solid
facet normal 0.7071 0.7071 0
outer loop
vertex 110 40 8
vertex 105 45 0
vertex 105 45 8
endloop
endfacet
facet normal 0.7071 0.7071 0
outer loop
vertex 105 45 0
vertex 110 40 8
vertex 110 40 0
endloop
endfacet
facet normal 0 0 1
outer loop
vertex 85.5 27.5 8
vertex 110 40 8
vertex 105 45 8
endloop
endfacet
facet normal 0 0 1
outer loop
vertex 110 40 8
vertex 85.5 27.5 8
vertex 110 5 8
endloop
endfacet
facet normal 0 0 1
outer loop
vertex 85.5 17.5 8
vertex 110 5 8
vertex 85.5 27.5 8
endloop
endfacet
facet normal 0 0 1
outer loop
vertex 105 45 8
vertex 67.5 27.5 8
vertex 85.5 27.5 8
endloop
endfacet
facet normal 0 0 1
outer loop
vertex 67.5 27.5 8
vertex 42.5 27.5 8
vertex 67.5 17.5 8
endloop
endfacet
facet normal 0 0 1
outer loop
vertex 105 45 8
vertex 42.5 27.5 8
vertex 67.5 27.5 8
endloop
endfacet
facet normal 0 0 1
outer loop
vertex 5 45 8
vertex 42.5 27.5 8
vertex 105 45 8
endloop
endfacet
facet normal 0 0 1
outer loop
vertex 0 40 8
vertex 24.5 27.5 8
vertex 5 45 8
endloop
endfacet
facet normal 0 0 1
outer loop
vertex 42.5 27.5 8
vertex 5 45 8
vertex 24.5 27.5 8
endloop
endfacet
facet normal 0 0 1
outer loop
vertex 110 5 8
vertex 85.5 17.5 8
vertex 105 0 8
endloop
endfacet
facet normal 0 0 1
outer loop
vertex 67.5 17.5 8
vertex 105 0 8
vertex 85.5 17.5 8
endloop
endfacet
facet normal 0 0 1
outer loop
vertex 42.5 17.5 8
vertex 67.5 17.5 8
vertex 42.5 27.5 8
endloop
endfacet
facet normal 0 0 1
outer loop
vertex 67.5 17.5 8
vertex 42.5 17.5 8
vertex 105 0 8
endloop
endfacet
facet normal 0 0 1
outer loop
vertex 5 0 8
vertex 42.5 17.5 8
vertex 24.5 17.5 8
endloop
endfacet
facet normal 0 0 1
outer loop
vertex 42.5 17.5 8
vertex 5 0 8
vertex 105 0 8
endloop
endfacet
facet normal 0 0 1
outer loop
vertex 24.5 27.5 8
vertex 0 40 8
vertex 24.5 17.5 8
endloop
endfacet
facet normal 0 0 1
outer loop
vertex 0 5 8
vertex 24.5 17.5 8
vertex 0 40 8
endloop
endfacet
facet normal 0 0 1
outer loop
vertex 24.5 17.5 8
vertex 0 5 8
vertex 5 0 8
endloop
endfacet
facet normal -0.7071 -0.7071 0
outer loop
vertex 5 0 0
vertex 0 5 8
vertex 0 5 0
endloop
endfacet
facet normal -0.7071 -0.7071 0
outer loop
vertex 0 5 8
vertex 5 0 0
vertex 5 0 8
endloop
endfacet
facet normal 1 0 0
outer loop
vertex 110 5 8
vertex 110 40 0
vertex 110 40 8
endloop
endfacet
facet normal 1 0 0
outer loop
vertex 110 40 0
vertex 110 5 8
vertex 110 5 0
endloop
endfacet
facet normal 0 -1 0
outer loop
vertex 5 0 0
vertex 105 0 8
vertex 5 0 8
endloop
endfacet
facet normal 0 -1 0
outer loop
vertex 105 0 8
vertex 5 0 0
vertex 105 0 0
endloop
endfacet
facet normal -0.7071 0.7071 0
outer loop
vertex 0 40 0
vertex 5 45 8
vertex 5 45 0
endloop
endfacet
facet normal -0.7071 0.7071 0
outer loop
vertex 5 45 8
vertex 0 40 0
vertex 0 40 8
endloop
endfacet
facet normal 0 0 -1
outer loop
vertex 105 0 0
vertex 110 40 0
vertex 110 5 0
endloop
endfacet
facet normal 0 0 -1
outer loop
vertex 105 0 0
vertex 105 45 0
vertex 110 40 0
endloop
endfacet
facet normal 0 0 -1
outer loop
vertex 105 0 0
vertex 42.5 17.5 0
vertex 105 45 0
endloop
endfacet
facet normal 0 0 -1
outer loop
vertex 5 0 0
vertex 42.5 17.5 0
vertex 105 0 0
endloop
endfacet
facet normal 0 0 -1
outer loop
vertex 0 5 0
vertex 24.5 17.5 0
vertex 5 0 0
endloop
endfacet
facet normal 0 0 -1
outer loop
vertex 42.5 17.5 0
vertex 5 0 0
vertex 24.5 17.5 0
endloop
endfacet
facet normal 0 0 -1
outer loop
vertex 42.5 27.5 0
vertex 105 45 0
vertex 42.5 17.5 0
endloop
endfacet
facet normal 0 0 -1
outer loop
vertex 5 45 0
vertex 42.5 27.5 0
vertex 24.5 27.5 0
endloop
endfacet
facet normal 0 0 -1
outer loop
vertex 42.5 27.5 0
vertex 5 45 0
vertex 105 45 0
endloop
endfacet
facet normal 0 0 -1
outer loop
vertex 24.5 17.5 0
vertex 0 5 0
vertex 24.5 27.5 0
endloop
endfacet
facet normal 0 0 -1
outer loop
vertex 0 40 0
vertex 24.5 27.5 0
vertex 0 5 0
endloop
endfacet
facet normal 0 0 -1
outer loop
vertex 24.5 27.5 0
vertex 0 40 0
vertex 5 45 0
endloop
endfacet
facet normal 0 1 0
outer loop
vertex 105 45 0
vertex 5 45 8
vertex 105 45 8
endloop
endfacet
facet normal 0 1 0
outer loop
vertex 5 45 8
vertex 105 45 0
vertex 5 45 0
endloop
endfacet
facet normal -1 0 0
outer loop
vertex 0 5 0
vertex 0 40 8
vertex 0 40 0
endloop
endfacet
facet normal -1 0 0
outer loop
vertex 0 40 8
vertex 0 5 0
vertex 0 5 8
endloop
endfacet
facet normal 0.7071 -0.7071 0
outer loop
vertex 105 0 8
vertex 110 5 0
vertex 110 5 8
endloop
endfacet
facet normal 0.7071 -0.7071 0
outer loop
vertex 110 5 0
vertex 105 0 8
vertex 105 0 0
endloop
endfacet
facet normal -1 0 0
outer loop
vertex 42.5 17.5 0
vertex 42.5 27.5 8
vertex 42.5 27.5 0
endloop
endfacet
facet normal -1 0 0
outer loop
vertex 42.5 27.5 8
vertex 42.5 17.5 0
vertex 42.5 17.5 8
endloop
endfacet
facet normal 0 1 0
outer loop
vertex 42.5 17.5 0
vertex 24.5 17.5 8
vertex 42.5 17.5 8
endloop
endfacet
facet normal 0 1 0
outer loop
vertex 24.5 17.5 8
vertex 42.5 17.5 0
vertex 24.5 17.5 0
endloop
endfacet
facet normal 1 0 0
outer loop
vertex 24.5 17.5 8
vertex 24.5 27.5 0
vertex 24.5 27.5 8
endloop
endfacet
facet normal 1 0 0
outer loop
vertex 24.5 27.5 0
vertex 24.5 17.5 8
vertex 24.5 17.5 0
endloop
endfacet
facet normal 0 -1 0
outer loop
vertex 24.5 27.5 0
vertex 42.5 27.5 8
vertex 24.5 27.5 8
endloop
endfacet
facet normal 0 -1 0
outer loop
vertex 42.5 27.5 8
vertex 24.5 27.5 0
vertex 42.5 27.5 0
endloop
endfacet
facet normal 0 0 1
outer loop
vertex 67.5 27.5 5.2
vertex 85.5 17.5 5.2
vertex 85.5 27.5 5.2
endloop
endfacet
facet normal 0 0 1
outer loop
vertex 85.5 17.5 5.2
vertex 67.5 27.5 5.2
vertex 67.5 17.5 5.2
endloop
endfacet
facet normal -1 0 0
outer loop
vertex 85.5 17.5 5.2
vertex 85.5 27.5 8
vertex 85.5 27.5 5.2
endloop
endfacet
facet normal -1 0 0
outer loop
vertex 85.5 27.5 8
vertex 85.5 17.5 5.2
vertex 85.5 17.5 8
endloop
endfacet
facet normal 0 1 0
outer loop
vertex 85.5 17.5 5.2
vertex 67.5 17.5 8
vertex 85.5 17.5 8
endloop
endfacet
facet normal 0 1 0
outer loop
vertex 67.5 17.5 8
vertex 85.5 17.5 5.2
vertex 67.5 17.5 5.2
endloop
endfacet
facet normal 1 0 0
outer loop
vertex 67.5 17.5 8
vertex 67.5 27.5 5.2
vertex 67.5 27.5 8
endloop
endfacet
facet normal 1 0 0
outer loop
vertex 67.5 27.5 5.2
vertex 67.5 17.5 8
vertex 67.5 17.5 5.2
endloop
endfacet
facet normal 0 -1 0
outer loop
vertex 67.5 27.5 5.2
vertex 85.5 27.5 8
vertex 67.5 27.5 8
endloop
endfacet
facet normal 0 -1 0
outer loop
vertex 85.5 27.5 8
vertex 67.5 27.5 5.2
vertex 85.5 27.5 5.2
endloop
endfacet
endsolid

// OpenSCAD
$fn = 32;

// ----------------------------------------------------------------------
// Windowed plate: 2 voids, 110 x 45 x 8 mm
// ----------------------------------------------------------------------

// --- parameters (mm) ---
plate_l = 110;            // plate length, X
plate_w = 45;             // plate width, Y
plate_t = 8;              // plate thickness, Z
edge_margin = 12;         // wall from the plate edge to any window
windows = 2;              // number of windows in the row
win_l = 18;               // window length
win_w = 10;               // window width
win_pitch = 43;           // window pitch along X
depth_1 = 8;              // depth of void 1 (full thickness = through)
depth_2 = 2.8;            // depth of void 2 (full thickness = through)
corner_c = 5;             // corner chamfer of the plate

profile = [[5, 0], [105, 0], [110, 5], [110, 40], [105, 45], [5, 45], [0, 40], [0, 5]];  // primary outline, 8 points, counter clockwise
void_1 = [[24.5, 17.5], [42.5, 17.5], [42.5, 27.5], [24.5, 27.5]];  // window 1 of the row, 4 points
void_2 = [[67.5, 17.5], [85.5, 17.5], [85.5, 27.5], [67.5, 27.5]];  // window 2 of the row, 4 points

// --- the one profile operation ---
difference() {
  linear_extrude(height = plate_t) polygon(points = profile);
  translate([0, 0, -1])
    linear_extrude(height = plate_t + 2) polygon(points = void_1);
  translate([0, 0, plate_t - depth_2])
    linear_extrude(height = depth_2 + 1) polygon(points = void_2);
}
